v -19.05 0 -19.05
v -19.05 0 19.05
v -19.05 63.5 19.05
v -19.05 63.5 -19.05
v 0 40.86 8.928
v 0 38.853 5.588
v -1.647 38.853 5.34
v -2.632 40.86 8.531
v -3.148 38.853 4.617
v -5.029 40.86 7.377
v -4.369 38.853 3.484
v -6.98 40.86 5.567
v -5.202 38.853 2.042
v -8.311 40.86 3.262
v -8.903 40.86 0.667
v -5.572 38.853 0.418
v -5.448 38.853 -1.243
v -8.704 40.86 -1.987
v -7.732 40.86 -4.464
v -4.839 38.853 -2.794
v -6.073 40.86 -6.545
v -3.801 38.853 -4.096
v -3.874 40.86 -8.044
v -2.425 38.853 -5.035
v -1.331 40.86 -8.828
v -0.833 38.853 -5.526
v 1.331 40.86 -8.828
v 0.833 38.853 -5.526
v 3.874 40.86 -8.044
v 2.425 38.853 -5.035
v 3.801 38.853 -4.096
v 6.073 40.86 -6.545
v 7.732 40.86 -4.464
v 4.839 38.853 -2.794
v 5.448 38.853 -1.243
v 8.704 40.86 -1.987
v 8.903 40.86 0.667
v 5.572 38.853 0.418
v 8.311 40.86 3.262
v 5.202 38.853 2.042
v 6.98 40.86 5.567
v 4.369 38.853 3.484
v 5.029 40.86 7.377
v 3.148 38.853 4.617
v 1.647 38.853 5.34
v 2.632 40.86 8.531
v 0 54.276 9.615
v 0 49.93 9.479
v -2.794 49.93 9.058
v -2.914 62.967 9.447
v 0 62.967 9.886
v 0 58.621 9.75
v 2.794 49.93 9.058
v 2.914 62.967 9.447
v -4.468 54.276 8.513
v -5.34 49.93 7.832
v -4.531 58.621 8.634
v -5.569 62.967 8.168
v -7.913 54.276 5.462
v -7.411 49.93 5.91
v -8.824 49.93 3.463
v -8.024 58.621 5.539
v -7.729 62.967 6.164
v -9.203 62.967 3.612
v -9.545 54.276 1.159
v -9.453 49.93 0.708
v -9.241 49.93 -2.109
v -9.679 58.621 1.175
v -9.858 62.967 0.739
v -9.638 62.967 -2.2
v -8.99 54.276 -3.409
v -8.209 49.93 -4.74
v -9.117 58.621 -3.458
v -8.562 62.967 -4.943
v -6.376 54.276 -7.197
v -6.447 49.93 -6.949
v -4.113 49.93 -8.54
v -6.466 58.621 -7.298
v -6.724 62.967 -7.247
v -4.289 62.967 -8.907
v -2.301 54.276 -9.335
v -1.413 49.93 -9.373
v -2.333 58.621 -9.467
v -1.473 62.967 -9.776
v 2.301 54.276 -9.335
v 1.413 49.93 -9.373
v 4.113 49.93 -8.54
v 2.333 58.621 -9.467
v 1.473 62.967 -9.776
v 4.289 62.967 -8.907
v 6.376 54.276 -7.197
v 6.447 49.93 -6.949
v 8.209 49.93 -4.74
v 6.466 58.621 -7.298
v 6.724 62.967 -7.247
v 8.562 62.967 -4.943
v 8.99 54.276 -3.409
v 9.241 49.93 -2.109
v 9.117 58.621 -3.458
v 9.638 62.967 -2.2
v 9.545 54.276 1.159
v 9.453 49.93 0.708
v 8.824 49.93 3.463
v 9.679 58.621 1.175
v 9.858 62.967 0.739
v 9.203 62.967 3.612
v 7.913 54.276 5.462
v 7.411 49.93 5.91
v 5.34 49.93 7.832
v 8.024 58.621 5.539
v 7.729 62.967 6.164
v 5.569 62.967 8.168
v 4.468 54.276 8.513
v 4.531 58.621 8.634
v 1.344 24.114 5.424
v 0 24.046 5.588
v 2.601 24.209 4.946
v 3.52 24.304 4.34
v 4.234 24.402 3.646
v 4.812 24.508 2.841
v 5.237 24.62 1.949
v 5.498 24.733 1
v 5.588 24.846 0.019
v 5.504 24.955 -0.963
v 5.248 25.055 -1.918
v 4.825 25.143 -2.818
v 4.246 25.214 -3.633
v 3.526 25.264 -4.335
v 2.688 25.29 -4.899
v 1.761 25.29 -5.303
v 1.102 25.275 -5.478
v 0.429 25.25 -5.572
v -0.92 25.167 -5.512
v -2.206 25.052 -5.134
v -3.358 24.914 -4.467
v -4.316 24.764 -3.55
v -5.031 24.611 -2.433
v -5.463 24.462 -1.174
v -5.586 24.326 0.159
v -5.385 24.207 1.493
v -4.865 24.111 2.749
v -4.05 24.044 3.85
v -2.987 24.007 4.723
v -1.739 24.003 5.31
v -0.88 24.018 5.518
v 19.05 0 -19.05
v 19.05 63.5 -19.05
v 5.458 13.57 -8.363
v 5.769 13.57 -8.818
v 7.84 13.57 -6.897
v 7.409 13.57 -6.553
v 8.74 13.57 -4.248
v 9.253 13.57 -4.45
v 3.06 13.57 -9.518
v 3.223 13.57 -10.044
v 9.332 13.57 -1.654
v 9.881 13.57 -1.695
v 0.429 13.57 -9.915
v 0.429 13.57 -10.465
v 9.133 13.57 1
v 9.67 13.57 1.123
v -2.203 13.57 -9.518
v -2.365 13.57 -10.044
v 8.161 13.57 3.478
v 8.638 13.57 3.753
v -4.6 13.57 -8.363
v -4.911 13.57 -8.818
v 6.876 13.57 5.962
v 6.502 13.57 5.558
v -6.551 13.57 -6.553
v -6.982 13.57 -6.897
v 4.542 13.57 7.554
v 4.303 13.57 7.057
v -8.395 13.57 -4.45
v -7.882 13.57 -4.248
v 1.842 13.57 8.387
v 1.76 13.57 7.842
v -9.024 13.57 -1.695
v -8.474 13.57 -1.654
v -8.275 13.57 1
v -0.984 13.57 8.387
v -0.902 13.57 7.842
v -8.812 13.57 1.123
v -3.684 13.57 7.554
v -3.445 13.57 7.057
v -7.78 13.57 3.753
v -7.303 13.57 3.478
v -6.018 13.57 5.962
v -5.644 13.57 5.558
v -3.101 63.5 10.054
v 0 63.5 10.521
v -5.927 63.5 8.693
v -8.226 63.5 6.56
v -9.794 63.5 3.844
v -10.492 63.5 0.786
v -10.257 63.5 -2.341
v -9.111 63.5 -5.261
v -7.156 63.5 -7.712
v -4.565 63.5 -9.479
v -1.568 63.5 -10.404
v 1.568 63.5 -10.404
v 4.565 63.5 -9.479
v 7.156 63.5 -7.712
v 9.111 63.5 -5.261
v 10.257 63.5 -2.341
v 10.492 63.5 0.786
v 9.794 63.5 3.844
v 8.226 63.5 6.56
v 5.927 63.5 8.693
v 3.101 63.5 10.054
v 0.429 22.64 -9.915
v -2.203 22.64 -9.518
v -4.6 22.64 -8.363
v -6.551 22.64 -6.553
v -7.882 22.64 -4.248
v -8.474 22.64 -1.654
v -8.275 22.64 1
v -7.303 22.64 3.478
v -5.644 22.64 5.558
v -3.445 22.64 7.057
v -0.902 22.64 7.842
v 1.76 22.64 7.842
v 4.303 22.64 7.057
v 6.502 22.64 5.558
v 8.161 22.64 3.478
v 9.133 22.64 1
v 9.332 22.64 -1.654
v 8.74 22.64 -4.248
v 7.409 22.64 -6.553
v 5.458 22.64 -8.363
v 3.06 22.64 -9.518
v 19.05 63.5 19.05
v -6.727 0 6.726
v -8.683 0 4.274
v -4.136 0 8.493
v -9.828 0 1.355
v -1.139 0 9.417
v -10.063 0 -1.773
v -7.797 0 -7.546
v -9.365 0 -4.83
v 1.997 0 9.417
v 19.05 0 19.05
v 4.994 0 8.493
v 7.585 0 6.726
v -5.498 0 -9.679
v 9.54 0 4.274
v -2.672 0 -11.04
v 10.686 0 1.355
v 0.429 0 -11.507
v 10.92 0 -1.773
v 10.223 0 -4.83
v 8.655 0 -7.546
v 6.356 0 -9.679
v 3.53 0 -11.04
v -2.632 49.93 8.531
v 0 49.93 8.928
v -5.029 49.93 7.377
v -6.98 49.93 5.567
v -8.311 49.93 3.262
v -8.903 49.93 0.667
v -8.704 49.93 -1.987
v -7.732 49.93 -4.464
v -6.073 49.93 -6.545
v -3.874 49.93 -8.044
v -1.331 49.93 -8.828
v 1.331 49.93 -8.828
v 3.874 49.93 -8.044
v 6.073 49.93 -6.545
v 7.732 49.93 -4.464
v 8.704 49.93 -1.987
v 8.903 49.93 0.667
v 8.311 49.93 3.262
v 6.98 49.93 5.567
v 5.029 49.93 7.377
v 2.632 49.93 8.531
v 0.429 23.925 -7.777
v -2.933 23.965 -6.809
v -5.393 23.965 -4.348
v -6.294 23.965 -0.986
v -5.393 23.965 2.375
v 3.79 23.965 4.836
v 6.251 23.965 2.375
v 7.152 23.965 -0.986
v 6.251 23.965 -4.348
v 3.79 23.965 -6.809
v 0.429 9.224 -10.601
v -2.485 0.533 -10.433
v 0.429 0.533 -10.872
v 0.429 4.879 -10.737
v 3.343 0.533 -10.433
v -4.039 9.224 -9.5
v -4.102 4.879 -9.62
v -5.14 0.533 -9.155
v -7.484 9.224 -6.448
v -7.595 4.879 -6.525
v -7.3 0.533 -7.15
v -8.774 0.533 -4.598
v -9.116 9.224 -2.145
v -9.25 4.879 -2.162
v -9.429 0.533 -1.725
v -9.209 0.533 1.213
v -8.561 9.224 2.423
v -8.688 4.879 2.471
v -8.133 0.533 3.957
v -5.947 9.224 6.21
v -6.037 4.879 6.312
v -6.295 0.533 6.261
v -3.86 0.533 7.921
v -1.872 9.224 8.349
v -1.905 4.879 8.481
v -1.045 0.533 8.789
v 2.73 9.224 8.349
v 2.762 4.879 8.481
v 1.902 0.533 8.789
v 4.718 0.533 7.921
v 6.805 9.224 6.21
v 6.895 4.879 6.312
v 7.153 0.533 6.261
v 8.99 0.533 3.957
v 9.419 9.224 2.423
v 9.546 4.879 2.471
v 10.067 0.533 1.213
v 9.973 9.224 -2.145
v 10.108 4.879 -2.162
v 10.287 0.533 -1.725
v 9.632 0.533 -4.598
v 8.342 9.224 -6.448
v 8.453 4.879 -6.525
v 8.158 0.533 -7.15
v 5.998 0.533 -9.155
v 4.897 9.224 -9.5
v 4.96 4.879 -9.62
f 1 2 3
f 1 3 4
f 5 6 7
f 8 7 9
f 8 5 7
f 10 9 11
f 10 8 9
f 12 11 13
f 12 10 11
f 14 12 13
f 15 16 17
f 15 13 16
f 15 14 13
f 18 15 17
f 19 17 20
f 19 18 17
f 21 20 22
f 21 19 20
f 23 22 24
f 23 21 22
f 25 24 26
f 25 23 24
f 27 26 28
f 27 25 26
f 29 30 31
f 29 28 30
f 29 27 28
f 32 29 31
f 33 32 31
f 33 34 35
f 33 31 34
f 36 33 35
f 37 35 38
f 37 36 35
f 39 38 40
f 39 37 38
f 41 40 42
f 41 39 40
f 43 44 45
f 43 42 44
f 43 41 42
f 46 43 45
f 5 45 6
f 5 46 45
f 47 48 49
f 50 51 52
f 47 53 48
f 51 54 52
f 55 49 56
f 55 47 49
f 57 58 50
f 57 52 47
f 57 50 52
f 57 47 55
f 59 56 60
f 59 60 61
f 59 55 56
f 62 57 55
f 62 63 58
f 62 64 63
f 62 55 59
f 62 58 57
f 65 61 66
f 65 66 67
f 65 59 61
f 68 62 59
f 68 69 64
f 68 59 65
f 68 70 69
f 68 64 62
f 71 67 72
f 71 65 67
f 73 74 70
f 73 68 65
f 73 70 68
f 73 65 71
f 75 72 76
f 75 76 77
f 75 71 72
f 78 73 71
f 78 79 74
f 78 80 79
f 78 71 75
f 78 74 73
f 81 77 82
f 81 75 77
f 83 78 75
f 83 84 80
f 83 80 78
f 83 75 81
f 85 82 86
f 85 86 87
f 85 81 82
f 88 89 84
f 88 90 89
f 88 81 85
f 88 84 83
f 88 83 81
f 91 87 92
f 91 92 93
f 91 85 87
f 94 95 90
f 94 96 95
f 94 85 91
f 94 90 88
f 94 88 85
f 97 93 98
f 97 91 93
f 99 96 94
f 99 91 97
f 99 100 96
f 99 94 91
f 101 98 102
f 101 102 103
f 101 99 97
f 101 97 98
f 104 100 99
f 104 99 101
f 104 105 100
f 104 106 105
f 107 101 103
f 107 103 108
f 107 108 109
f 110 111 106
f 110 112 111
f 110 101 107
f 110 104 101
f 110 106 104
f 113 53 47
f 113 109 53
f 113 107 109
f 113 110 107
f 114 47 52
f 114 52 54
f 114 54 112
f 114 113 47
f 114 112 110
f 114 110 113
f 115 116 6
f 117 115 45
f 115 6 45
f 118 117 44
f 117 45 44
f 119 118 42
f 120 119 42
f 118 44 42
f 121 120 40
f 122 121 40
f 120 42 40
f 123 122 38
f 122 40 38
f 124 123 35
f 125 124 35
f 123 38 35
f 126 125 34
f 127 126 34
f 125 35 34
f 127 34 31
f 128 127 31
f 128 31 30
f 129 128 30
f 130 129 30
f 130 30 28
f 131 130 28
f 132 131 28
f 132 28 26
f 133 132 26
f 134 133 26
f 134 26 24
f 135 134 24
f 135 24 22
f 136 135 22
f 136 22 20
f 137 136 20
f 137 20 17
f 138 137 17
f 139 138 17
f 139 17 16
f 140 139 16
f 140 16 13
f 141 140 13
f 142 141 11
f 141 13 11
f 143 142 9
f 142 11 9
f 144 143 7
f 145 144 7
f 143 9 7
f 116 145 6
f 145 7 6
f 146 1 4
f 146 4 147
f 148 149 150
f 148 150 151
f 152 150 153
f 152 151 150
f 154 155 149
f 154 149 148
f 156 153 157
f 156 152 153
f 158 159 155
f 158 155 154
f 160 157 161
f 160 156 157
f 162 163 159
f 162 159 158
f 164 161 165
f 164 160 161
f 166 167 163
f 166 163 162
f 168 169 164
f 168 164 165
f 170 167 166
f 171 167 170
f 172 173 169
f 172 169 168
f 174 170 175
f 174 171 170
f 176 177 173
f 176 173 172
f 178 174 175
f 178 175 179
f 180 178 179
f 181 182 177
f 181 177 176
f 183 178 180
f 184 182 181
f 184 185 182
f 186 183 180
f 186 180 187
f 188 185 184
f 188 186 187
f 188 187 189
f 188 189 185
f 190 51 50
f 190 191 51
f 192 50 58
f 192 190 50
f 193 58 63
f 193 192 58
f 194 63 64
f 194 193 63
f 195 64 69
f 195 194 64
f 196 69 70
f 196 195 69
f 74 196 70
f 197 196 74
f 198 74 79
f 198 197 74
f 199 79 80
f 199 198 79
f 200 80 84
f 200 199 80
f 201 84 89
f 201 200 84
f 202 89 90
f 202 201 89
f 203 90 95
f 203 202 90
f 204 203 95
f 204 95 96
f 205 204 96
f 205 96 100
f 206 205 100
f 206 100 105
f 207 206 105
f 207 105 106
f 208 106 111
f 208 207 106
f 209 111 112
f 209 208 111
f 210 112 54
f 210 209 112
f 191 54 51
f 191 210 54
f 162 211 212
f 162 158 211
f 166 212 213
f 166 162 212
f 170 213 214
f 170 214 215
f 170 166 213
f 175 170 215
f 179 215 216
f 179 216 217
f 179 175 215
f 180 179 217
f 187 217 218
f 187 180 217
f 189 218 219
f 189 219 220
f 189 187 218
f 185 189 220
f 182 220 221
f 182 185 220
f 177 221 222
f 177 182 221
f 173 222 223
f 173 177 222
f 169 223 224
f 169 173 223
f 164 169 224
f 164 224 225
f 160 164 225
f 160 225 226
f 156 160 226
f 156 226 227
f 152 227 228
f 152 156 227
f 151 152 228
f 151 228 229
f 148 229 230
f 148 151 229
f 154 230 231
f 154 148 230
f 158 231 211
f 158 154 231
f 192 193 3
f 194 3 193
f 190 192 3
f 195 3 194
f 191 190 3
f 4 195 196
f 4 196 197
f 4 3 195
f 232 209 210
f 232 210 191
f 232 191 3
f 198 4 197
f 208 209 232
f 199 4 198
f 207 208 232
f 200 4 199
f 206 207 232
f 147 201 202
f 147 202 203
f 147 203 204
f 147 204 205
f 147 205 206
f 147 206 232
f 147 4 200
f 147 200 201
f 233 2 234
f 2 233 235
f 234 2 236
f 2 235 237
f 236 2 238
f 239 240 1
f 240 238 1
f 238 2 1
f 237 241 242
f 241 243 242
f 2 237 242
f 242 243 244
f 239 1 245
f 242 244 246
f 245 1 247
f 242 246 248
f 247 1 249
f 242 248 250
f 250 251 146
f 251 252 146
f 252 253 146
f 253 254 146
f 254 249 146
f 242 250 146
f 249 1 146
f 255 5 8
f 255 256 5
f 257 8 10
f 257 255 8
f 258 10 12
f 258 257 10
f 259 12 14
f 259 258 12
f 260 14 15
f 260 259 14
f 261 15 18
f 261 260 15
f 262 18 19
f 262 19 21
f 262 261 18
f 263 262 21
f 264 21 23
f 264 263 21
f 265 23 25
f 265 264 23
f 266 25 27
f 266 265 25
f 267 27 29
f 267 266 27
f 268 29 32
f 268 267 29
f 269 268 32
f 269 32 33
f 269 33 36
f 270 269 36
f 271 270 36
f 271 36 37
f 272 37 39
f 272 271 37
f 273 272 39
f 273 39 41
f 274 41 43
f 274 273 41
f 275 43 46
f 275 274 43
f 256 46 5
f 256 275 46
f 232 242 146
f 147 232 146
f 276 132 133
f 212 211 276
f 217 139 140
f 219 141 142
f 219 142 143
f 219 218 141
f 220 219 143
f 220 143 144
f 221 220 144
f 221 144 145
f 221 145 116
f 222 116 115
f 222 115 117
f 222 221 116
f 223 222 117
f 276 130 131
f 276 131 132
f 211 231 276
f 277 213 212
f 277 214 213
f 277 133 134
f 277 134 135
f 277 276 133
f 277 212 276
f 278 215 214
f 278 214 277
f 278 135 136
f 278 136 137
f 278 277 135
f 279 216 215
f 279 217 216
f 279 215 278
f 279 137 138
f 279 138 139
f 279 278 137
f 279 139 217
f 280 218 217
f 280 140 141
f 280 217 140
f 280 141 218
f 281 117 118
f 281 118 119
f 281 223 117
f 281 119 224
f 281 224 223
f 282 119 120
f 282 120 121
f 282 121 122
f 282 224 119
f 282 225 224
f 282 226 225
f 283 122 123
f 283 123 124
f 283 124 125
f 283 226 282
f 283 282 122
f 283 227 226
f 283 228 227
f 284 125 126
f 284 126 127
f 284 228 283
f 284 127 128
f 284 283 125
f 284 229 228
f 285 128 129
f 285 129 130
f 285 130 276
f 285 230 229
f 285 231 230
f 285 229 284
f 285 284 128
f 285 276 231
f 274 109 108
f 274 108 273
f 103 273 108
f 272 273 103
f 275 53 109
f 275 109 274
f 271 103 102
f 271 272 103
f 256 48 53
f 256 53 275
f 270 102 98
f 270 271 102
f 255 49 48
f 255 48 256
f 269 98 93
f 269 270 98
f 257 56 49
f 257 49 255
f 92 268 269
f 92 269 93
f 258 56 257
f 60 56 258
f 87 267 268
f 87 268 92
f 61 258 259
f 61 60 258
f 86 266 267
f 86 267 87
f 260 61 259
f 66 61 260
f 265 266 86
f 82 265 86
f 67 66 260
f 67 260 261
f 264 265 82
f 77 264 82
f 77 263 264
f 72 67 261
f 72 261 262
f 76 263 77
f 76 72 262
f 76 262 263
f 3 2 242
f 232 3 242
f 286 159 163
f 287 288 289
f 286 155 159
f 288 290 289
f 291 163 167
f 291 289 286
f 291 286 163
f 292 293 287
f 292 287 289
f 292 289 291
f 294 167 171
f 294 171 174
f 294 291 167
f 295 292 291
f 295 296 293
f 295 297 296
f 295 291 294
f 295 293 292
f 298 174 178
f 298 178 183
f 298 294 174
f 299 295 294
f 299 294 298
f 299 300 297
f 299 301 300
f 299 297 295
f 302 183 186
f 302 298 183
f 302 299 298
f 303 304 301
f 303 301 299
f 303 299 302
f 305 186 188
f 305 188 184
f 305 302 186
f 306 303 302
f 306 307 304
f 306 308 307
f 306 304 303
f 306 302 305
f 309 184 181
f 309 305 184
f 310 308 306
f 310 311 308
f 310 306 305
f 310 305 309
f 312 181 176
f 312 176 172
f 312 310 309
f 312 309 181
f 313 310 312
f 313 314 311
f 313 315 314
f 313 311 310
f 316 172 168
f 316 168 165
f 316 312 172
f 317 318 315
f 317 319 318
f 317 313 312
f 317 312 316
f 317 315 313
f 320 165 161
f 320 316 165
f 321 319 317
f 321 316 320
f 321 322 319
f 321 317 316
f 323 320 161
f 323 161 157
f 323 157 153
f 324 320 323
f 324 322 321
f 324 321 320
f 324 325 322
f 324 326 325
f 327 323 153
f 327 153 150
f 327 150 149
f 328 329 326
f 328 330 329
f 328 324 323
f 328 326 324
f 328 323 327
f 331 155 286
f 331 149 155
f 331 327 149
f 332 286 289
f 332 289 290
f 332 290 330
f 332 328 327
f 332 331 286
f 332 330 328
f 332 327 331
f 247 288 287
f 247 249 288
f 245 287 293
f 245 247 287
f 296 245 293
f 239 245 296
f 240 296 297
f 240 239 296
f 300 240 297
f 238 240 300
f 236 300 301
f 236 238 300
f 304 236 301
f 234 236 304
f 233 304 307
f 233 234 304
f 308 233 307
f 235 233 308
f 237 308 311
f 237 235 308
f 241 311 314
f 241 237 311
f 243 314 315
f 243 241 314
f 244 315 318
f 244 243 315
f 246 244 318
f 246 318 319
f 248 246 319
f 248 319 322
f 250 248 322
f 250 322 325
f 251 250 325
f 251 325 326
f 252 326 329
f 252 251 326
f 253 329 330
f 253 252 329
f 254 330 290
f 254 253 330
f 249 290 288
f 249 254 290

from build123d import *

# Parameters (mm, degrees)
SKETCH_1_W         = 38.1
SKETCH_1_H         = 38.1
EXTRUDE_1_DEPTH    = 63.5
SKETCH5_R          = 5.588
CUT_EXTRUDE1_DEPTH = 69.978656119


with BuildPart() as part:
    # 草图1 → 凸台-拉伸1 (new body)
    with BuildSketch(Plane(origin=(0, 0, 0), x_dir=(1, 0, 0), z_dir=(0, 1, 0))):
        Rectangle(SKETCH_1_W, SKETCH_1_H)
    extrude(amount=EXTRUDE_1_DEPTH)

    # Sketch2 → 1/2 NPT Tapped Hole2 (revolve, cut)
    with BuildSketch(Plane(origin=(0, 63.5, 0), x_dir=(0, 0, 1), z_dir=(1, 0, 0))):
        Polygon((0, 0), (0, 28.004543693), (8.9281, 22.64), (8.9281, 13.57), (9.479012286, 13.57), (9.8860229, 0.532828266), (10.5210229, 0), align=None)
    revolve(axis=Axis((0, 69.85, 0), (0, -1, 0)), mode=Mode.SUBTRACT)

    # Sketch4 → 1/2 NPT Tapped Hole1 (revolve, cut)
    with BuildSketch(Plane(origin=(0.428891136, 0, -0.986449612), x_dir=(0, 0, -1), z_dir=(1, 0, 0))):
        Polygon((0, 0), (0, 28.004543693), (8.9281, 22.64), (8.9281, 13.57), (9.479012286, 13.57), (9.8860229, 0.532828266), (10.5210229, 0), align=None)
    revolve(axis=Axis((0.428891136, -6.35, -0.986449612), (0, 1, 0)), mode=Mode.SUBTRACT)

    # Sketch5 → Cut-Extrude1 (cut, through all)
    with BuildSketch(Plane(origin=(0, 63.5, 0), x_dir=(1, 0, 0), z_dir=(0, 1, 0))):
        Circle(SKETCH5_R)
    extrude(amount=-CUT_EXTRUDE1_DEPTH, mode=Mode.SUBTRACT)


solid = part.part
